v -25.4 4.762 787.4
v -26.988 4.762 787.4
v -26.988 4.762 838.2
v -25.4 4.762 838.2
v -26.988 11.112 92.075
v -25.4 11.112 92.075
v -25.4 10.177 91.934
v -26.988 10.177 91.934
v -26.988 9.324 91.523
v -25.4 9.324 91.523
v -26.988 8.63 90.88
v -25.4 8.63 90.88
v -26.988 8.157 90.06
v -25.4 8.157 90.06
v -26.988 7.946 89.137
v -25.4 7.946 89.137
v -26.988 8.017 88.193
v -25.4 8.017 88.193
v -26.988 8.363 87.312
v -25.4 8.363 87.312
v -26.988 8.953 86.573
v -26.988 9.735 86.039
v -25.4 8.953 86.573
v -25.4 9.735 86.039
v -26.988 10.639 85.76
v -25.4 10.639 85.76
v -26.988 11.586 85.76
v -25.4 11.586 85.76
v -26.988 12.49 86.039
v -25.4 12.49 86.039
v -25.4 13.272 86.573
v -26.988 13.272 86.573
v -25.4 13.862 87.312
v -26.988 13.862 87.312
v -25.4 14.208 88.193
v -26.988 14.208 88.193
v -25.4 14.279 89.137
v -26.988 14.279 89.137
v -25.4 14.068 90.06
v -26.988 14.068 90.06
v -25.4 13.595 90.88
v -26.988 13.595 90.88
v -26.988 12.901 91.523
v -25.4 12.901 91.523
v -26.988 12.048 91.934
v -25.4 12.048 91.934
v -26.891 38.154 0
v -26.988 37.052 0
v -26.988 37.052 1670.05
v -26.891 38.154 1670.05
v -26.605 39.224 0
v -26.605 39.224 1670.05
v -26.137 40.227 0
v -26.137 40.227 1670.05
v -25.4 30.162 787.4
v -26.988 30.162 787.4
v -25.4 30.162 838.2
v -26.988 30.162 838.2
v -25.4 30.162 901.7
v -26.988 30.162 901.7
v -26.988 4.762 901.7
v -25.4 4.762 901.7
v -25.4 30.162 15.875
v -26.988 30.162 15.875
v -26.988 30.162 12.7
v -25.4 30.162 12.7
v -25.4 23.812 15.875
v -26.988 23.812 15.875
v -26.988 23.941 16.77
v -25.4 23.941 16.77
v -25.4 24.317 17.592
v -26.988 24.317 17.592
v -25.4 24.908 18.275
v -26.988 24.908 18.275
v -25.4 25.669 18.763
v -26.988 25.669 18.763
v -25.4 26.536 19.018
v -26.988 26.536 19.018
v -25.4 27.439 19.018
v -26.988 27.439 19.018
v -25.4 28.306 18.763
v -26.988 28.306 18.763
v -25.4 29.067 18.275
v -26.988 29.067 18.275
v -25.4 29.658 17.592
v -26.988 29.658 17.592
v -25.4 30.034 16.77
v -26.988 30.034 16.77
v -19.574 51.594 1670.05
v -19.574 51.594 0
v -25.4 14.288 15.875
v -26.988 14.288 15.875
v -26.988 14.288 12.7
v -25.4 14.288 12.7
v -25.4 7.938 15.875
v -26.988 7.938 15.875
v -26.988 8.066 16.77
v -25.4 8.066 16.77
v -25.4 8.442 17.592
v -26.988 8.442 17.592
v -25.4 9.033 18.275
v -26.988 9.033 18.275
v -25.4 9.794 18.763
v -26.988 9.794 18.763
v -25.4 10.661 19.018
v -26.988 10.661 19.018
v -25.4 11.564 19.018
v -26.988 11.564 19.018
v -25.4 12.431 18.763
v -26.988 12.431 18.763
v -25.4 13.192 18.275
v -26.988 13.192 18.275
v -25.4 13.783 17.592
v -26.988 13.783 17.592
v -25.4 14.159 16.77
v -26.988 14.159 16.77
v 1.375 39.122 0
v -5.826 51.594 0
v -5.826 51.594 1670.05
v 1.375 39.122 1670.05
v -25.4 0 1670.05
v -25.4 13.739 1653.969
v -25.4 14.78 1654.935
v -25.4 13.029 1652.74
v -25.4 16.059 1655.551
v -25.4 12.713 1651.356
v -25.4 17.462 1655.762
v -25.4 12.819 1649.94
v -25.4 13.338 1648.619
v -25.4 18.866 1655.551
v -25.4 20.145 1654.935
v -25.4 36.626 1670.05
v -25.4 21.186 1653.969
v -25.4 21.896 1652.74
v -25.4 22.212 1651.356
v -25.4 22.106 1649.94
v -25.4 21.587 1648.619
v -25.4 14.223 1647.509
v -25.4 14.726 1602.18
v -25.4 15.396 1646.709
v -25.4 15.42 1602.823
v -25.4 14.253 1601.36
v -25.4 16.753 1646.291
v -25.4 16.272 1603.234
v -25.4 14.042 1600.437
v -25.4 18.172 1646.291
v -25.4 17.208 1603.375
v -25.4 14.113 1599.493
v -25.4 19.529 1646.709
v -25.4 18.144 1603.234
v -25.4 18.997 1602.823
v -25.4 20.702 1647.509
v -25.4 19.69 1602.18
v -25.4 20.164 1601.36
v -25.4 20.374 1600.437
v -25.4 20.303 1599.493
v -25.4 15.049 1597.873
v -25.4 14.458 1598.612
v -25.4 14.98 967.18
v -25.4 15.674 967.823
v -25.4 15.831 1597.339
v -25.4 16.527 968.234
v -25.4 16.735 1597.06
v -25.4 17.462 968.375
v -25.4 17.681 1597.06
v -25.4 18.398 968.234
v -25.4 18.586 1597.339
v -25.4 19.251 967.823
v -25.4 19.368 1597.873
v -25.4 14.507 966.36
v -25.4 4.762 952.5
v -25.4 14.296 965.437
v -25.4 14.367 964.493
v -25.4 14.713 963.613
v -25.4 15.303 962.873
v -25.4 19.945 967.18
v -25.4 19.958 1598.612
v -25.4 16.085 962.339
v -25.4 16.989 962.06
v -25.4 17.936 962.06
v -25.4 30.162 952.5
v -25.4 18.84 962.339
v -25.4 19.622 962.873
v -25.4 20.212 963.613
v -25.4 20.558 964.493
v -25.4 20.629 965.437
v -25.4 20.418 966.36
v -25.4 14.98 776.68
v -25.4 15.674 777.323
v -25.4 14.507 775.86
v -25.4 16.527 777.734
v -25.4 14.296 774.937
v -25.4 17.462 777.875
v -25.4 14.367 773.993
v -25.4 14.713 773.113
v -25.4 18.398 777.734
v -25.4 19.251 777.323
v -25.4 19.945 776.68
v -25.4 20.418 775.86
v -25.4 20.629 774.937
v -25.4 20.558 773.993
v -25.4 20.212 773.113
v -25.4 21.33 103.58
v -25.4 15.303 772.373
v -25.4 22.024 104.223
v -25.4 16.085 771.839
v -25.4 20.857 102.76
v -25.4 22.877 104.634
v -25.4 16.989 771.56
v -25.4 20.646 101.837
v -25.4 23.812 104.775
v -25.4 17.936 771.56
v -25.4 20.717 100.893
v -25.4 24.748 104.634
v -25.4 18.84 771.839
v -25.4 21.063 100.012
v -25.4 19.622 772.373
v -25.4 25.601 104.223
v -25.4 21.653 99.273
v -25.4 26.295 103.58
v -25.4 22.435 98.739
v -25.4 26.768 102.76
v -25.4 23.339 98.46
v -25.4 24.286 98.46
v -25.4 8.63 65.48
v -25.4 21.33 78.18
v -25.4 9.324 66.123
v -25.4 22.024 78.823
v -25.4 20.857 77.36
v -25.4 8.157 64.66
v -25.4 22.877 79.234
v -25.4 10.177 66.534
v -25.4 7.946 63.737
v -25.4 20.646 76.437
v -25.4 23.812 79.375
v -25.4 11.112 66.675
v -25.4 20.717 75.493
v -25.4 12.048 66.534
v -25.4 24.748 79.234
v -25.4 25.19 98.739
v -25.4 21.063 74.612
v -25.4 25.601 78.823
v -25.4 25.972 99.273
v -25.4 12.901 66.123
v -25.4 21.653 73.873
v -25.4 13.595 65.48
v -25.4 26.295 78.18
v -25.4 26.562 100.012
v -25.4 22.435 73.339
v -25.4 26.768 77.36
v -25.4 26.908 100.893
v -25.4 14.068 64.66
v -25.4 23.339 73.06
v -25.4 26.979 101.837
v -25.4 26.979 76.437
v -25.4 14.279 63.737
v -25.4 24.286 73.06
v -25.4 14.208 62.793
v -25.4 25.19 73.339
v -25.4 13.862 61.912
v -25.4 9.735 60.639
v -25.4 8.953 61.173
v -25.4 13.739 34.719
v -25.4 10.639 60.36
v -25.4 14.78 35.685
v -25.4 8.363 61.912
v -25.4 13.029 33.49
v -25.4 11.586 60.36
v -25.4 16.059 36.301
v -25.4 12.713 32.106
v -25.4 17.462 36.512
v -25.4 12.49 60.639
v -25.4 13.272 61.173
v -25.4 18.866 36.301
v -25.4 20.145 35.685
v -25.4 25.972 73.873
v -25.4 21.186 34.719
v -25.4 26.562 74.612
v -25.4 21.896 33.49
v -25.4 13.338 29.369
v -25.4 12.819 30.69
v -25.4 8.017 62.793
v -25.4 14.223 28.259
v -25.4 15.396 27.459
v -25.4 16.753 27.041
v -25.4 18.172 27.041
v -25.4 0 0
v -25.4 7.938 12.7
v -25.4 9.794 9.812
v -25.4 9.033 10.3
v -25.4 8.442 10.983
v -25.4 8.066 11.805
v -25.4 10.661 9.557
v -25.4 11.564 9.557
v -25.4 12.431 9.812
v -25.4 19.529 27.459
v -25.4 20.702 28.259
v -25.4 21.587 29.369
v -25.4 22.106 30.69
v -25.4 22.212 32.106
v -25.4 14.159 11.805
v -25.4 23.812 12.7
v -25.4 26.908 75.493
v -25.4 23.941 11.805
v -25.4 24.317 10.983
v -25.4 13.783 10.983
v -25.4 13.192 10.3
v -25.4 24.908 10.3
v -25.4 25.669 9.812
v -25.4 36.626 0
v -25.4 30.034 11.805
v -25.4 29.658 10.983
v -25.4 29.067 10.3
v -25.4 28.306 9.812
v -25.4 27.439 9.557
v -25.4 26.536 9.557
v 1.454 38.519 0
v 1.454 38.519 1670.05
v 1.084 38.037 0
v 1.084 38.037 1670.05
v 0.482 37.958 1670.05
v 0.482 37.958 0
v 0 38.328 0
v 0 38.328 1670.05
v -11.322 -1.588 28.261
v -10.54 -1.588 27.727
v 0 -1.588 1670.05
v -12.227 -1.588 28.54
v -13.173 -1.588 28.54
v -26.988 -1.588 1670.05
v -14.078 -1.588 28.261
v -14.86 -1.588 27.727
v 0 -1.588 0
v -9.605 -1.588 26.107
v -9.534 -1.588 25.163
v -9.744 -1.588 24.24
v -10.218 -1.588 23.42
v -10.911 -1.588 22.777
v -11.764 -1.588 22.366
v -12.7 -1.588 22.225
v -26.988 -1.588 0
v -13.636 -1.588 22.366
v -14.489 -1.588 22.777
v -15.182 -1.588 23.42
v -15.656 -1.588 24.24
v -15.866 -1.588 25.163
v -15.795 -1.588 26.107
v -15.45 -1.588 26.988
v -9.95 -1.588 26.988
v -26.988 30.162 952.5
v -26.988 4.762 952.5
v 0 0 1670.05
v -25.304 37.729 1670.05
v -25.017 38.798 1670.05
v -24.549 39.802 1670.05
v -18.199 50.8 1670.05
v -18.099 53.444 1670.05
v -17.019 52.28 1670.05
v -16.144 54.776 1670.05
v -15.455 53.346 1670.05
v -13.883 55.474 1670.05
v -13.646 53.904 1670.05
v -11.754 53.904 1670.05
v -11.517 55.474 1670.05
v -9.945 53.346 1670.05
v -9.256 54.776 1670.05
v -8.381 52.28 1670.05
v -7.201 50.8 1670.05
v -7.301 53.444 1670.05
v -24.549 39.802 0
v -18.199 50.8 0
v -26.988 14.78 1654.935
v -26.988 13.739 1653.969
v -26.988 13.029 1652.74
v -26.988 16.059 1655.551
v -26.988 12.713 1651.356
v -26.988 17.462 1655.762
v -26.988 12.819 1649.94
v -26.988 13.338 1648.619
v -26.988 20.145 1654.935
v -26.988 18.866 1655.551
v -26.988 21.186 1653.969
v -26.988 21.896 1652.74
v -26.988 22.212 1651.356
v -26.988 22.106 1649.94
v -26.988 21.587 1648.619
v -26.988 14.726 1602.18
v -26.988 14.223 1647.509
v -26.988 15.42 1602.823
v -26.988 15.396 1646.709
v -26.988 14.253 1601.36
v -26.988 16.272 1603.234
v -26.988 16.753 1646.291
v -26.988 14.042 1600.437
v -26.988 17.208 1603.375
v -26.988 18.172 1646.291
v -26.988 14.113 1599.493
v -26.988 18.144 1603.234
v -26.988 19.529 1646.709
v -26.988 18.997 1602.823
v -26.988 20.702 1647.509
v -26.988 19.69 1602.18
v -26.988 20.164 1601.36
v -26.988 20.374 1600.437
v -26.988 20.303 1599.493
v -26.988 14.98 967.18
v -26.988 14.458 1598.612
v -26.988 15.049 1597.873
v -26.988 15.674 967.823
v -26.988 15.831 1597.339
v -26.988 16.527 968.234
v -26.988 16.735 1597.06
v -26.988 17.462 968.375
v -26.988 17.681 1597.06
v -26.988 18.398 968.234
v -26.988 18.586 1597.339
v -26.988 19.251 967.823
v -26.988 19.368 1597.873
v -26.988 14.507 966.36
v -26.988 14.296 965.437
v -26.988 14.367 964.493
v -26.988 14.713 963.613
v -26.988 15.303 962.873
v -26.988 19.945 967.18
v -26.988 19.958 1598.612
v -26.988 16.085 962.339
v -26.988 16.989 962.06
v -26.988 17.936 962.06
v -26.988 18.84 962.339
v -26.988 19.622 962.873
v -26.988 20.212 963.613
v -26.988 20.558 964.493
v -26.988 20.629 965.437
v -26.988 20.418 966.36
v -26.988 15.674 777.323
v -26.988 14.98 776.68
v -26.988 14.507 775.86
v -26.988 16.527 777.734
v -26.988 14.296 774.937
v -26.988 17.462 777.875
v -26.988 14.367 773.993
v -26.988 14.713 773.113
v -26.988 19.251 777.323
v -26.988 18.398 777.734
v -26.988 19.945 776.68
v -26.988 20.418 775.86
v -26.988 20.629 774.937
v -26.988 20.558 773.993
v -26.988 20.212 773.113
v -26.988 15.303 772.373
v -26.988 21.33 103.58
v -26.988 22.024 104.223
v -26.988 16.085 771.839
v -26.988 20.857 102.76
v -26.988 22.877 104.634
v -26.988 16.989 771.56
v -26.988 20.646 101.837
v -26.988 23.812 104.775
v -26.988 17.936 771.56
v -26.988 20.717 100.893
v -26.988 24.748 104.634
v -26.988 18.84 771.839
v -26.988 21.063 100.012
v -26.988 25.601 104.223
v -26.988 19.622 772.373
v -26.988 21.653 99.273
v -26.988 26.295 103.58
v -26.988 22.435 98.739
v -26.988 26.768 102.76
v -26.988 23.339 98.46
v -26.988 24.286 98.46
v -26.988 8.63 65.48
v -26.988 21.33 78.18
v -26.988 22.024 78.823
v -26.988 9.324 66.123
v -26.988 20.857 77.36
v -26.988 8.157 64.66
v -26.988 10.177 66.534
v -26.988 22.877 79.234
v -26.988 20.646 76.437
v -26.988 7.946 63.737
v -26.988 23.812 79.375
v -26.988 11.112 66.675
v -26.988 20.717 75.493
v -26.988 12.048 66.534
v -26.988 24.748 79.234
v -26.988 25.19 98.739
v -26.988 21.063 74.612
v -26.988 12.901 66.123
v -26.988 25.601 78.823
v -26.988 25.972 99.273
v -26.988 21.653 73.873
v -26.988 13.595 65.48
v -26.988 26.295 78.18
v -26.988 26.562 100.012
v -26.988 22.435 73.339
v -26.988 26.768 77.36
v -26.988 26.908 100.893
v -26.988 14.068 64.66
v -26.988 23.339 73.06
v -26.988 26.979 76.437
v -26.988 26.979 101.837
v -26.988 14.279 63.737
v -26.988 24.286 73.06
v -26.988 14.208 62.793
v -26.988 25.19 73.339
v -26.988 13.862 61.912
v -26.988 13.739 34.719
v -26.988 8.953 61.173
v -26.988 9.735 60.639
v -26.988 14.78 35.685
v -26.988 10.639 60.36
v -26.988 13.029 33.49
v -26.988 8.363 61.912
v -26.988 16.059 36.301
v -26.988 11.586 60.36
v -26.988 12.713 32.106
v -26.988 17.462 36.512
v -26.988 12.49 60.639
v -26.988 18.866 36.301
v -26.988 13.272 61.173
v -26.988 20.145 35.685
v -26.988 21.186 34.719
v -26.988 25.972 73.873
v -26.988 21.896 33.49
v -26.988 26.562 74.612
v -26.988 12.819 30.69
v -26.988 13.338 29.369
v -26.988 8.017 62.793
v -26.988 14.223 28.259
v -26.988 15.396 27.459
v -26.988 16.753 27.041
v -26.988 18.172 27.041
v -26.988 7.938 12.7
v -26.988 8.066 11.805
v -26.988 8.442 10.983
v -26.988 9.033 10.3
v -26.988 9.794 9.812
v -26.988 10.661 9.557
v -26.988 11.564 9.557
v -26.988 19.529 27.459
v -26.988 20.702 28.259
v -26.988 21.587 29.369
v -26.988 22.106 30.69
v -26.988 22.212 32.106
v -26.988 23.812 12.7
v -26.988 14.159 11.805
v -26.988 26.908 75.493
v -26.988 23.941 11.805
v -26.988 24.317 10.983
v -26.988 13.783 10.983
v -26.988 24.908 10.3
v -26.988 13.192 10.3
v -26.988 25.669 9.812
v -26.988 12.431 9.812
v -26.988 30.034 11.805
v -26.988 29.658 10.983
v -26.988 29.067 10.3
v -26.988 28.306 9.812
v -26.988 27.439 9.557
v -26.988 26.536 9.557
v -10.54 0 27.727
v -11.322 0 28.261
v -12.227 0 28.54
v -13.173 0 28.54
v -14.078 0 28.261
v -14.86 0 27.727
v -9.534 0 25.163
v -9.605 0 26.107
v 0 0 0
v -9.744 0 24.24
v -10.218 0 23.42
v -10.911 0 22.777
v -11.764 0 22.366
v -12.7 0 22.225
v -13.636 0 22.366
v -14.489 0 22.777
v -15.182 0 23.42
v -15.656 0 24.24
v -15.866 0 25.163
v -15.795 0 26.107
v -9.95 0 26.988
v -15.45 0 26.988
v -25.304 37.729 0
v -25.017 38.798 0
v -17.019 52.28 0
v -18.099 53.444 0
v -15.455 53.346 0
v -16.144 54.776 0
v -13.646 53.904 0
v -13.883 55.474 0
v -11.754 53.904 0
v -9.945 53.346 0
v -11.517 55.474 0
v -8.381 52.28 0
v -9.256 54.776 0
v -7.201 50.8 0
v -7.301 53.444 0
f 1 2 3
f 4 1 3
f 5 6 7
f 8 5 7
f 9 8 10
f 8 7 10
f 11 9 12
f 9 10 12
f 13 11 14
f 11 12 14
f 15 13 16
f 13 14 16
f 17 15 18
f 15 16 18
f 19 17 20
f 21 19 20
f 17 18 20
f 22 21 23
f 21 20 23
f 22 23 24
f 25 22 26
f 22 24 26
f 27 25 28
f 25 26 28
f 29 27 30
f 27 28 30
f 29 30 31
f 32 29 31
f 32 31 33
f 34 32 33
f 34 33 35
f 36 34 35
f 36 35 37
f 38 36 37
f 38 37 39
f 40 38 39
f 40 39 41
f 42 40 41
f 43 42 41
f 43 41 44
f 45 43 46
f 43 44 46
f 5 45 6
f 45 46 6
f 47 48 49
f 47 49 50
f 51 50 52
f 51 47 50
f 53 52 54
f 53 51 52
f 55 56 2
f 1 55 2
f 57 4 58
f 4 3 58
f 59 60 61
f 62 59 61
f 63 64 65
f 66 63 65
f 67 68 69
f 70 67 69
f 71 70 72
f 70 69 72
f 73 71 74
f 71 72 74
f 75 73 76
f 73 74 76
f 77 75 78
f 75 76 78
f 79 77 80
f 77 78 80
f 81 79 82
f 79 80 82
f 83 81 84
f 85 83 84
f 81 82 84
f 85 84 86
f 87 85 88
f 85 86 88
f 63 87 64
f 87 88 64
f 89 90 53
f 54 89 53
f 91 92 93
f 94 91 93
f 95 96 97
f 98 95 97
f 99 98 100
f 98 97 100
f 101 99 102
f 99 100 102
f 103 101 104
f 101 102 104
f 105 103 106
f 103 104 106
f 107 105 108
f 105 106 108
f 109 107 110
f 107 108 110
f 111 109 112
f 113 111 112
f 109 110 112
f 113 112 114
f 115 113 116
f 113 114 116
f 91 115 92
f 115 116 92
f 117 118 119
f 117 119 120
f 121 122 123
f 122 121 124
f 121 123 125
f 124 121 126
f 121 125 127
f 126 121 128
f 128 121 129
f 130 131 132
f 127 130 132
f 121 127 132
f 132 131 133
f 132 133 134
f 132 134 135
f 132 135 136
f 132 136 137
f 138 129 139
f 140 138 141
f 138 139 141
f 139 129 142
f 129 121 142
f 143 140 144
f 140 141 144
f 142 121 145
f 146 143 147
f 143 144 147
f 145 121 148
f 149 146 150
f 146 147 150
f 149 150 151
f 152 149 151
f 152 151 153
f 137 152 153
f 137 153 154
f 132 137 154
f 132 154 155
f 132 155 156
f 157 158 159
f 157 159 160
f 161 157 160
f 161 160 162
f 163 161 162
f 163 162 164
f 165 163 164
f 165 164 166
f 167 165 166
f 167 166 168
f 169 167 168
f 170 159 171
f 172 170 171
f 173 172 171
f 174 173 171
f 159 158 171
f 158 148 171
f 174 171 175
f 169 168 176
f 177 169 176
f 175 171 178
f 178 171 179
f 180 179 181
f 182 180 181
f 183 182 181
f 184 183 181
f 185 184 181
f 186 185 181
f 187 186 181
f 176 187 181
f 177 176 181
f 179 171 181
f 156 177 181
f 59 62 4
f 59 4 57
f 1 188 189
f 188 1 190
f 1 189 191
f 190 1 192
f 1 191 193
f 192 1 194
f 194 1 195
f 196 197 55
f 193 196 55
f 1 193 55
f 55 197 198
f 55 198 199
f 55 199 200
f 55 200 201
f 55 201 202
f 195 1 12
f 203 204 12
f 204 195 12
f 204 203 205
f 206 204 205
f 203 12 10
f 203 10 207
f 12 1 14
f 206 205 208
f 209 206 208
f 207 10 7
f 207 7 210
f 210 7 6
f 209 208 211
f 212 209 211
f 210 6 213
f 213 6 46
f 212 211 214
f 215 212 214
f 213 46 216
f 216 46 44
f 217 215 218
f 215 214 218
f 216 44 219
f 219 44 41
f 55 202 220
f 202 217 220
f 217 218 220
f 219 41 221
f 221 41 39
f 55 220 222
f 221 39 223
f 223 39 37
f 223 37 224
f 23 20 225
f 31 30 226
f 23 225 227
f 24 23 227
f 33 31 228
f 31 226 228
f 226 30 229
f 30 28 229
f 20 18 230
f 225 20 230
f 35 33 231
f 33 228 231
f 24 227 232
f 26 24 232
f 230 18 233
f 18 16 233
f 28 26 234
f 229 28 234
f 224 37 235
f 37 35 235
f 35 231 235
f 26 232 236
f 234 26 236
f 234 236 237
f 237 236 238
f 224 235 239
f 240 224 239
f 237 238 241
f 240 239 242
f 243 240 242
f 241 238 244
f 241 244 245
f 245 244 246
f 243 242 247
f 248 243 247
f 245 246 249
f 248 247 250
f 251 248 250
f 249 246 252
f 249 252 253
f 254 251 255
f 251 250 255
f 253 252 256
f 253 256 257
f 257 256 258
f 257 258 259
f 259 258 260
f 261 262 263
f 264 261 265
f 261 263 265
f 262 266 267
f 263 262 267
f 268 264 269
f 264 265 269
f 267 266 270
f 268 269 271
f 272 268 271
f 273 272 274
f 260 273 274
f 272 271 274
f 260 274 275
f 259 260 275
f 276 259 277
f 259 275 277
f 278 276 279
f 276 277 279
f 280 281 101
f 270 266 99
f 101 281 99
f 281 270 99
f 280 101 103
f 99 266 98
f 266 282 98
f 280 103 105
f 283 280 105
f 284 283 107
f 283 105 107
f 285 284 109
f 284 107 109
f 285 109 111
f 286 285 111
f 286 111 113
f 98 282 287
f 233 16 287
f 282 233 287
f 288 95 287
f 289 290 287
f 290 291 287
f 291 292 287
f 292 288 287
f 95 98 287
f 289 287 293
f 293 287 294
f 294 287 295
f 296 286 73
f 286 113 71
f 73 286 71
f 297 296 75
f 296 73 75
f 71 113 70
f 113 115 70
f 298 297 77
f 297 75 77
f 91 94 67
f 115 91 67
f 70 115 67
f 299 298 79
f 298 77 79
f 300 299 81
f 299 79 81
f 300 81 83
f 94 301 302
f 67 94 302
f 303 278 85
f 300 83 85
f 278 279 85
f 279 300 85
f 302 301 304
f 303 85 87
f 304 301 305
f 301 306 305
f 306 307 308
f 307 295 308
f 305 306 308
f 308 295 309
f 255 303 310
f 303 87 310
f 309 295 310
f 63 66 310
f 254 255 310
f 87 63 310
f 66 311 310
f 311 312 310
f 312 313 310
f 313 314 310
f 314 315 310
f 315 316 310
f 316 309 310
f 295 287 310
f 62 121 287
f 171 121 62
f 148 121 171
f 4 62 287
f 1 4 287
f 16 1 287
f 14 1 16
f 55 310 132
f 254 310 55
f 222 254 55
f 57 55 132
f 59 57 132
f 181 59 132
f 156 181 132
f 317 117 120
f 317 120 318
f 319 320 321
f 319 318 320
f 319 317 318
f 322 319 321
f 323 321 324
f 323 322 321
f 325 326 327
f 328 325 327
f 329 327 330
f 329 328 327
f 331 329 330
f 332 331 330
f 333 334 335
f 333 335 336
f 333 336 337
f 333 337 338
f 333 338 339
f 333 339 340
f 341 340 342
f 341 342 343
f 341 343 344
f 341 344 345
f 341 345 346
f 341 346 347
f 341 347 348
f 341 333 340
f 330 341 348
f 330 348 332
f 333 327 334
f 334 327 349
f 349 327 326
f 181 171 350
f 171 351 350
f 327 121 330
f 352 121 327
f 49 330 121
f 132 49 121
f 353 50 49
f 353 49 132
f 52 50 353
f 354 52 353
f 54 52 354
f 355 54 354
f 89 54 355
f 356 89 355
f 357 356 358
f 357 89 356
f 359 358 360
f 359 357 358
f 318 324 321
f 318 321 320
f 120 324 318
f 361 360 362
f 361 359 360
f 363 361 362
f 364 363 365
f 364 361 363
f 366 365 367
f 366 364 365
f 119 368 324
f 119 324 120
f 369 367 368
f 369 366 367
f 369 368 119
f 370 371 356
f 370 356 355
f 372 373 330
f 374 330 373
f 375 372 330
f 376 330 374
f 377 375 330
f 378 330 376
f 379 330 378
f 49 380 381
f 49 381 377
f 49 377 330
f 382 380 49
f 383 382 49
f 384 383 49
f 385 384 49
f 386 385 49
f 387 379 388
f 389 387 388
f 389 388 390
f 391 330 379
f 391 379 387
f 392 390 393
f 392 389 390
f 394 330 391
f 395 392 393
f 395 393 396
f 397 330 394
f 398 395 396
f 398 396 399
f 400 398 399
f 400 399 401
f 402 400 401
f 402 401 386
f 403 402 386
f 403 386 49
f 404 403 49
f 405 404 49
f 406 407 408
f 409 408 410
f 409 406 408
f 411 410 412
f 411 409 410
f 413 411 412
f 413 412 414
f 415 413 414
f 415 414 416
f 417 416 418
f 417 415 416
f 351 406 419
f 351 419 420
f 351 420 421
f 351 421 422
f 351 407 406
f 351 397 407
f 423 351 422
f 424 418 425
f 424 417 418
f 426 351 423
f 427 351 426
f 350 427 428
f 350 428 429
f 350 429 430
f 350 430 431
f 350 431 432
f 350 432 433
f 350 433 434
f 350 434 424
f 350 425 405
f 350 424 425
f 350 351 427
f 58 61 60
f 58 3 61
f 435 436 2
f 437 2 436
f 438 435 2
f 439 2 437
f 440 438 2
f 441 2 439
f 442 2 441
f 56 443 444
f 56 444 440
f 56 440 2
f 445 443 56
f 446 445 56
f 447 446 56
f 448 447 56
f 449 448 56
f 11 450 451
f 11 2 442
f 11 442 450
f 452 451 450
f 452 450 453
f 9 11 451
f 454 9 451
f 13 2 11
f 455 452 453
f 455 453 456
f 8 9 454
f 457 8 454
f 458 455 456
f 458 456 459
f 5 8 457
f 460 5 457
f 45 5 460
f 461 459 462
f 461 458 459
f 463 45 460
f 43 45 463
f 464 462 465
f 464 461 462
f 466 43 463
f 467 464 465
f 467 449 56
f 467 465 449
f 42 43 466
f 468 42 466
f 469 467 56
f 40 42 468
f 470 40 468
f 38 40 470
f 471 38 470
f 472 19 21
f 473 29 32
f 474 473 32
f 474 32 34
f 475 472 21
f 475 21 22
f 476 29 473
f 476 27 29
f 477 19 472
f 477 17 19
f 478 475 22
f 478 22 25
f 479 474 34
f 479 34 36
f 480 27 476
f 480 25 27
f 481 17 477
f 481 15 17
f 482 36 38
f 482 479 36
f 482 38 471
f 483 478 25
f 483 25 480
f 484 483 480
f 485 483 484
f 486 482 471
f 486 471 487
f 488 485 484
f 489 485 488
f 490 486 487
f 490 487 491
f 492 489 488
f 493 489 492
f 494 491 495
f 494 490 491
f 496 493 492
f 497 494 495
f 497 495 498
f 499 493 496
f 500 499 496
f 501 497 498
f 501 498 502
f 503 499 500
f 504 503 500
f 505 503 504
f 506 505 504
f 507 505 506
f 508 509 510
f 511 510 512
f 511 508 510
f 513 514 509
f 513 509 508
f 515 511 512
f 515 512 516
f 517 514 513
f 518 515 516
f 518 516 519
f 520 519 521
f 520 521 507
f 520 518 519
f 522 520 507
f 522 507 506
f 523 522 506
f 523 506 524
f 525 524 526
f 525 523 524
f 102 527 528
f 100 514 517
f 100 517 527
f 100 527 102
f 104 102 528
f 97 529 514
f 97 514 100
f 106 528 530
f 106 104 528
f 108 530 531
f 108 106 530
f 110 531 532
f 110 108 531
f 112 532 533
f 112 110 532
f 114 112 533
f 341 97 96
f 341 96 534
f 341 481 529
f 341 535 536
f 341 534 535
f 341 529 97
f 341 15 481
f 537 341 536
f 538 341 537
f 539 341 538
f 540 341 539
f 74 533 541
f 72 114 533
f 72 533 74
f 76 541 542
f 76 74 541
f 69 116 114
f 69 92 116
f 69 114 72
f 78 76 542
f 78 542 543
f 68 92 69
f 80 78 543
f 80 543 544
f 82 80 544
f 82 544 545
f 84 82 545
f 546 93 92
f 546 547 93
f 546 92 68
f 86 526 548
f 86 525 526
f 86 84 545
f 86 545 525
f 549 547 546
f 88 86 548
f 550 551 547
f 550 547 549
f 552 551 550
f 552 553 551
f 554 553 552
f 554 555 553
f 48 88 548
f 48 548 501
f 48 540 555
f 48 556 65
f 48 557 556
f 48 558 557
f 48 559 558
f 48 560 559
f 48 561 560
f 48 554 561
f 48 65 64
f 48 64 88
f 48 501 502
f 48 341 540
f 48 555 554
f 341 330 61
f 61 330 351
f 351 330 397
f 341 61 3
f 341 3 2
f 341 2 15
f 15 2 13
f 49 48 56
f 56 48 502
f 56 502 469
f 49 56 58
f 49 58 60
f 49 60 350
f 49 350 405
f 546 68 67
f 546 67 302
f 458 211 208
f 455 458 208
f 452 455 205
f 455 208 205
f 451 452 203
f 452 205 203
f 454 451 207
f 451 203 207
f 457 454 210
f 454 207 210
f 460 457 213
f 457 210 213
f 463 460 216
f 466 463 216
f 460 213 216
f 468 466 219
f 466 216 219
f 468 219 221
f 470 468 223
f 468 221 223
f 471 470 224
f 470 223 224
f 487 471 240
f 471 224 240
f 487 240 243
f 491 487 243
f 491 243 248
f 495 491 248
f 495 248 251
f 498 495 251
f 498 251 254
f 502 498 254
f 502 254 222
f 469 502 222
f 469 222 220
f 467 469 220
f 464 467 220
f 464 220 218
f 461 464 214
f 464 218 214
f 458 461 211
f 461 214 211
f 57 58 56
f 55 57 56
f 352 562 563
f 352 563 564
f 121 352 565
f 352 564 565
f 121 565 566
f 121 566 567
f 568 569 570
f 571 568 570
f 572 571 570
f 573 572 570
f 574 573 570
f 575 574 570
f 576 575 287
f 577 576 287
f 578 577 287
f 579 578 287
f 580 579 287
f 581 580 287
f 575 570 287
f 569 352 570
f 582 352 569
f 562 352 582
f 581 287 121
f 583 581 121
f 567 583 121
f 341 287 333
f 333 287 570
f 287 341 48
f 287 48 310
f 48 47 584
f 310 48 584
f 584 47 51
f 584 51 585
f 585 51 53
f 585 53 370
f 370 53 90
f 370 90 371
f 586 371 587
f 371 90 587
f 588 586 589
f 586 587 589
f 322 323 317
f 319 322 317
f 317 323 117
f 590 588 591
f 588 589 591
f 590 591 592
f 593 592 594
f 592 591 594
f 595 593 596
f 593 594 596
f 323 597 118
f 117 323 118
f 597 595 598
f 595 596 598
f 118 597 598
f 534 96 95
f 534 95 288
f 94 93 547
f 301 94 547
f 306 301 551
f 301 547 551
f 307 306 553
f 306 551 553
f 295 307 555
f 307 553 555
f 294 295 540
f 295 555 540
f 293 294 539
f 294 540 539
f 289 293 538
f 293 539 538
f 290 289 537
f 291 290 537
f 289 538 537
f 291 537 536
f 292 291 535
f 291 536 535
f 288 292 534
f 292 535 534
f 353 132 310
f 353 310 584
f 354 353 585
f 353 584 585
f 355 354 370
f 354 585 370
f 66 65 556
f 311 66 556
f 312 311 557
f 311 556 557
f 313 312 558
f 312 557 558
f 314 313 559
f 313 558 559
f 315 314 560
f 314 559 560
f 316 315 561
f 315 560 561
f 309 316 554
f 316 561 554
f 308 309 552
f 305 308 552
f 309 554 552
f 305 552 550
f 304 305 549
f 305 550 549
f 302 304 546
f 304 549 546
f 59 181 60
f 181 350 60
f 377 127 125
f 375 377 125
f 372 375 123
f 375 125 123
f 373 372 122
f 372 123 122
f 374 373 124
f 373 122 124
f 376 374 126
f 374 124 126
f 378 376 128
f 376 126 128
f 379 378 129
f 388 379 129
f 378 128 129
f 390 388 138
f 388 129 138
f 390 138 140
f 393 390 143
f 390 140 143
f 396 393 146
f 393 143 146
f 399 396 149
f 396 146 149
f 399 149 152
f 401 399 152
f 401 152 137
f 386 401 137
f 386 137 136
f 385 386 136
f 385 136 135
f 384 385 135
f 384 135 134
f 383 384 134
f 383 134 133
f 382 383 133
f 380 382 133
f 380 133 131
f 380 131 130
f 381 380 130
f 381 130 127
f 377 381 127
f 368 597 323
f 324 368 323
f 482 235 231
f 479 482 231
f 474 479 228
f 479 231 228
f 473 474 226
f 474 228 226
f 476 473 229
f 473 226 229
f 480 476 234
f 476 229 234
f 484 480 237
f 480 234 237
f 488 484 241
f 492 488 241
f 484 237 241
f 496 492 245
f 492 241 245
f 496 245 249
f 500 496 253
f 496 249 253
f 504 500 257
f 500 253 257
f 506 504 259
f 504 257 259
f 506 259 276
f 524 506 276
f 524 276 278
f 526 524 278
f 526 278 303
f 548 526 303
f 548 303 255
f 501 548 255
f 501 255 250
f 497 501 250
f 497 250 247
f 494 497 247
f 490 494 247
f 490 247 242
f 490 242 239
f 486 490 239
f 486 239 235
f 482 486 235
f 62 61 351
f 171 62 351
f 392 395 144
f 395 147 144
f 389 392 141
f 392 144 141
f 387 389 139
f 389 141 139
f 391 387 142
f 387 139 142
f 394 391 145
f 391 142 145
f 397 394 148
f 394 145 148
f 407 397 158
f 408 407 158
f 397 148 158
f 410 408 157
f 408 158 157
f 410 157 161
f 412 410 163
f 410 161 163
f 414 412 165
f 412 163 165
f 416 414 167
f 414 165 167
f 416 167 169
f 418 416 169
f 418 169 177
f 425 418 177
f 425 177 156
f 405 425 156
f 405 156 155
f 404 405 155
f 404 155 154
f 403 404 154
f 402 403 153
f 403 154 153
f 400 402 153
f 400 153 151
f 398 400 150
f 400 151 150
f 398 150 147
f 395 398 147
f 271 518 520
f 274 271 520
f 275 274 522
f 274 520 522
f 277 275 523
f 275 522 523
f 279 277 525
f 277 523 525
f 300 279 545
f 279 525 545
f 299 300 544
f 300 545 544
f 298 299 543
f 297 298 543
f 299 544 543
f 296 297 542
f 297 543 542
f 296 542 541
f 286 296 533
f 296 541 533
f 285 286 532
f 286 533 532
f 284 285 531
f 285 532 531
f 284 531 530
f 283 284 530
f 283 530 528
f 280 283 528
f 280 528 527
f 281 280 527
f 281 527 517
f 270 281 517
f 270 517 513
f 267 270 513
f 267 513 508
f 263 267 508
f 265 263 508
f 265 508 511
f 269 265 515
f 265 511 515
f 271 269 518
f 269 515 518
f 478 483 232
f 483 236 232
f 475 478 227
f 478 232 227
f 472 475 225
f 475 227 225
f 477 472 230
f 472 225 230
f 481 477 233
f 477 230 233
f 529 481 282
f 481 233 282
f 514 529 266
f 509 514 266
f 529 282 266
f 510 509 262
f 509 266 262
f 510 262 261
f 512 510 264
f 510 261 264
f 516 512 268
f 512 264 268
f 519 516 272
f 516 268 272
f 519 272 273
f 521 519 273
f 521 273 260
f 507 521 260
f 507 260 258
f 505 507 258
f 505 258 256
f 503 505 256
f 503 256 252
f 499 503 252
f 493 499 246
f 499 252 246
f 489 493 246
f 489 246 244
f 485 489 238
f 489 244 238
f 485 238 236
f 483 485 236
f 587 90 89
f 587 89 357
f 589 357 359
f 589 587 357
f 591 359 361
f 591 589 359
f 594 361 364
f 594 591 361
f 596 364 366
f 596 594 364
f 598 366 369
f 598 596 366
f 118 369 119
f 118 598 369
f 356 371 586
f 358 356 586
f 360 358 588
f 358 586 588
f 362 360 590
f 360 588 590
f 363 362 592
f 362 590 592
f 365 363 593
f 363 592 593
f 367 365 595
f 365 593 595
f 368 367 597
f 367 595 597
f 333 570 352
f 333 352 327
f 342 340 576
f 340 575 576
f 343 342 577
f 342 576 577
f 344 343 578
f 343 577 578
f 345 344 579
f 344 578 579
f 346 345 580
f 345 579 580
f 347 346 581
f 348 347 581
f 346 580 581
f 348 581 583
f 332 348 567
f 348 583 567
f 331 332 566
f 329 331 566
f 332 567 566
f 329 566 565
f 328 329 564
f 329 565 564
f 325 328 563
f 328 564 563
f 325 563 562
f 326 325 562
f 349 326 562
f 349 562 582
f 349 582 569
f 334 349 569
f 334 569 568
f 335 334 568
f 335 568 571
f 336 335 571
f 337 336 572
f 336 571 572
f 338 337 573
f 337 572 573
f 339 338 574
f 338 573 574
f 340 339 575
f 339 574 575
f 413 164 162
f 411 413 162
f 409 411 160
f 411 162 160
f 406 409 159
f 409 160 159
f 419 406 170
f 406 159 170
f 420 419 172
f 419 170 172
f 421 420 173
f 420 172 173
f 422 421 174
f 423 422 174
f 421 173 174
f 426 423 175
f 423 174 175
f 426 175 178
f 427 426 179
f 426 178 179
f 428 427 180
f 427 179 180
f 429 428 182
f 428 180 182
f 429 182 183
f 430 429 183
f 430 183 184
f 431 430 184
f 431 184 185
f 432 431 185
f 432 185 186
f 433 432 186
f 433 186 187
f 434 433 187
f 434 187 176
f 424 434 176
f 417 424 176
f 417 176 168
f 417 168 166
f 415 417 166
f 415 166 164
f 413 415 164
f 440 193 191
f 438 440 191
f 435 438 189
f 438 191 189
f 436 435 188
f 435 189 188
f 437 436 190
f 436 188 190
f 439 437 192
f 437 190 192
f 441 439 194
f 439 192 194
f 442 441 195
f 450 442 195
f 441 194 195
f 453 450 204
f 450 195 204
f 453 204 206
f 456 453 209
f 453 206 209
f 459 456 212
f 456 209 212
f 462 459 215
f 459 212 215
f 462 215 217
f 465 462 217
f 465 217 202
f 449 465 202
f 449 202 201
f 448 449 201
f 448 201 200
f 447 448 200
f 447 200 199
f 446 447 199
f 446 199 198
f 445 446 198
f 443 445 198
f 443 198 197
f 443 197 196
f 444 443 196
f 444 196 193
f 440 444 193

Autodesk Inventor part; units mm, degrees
ref_plane "YZ Plane" through (0, 0, 0) normal (1, 0, 0) x (0, 1, 0)
ref_plane "XZ Plane" through (0, 0, 0) normal (0, 1, 0) x (-1, 0, 0)
ref_plane "XY Plane" through (0, 0, 0) normal (0, 0, 1) x (1, 0, 0)
sketch "Sketch1" plane through (0, 0, 0) normal (0, 0, 1) x (1, 0, 0)
  line L0 (0, 0) -> (-12.7, 0) construction
  line L1 (-12.7, 0) -> (-12.7, 53.975) construction
  line L2 (-12.7, 53.975) -> (0, 53.975) construction
  line L3 (0, 53.975) -> (0, 0) construction
  line L4 (-12.7, 53.975) -> (-25.4, 53.975) construction
  line L5 (-12.7, 53.975) -> (0, 53.975) construction
  line L6 (-25.4, 53.975) -> (-25.4, 0) construction
  line L7 (-25.4, 0) -> (-12.7, 0) construction
  circle A0 centre (-12.7, 6.35) radius 6.35 construction
  circle A1 centre (-12.7, 47.625) radius 6.35 construction
  line L8 (-12.7, 47.625) -> (-18.1993, 50.8) construction
  line L9 (-12.7, 47.625) -> (-6.35, 47.625) construction
  line L10 (-12.7, 47.625) -> (-7.2007, 50.8) construction
  line L11 (-12.7, 47.625) -> (-6.35, 47.625) construction
  line L12 (0, 0) -> (-25.4, 0)
  line L13 (0, 0) -> (0, -1.5875)
  line L14 (0, 0) -> (1.5875, 0) construction
  line L15 (0, -1.5875) -> (-26.9875, -1.5875)
  arc A2 (-7.2007, 50.8) -> (-18.1993, 50.8) centre (-12.7, 47.625) ccw
  line L16 (-7.2007, 50.8) -> (0, 38.328)
  line L17 (-7.2007, 50.8) -> (7.2007, 50.8) construction
  line L18 (-18.1993, 50.8) -> (-24.5493, 39.8015)
  line L19 (-18.1993, 50.8) -> (-5.4993, 50.8) construction
  line L20 (-25.4, 0) -> (-25.4, 36.6265)
  line L21 (-19.5741, 51.5937) -> (-26.1368, 40.2268)
  line L22 (-26.9875, -1.5875) -> (-26.9875, 37.0518)
  arc A3 (-26.1368, 40.2268) -> (-26.9875, 37.0518) centre (-20.6375, 37.0518) ccw
  arc A4 (-24.5493, 39.8015) -> (-25.4, 36.6265) centre (-19.05, 36.6265) ccw
  line L23 (-5.8259, 51.5937) -> (1.3748, 39.1217)
  arc A5 (-5.8259, 51.5937) -> (-19.5741, 51.5937) centre (-12.7, 47.625) ccw
  arc A6 (0, 38.328) -> (1.3748, 39.1217) centre (0.6874, 38.7248) ccw
  point P0 (-25.4, 38.328)
  dimension "d0" = 12.7
  dimension "d1" = 53.975
  dimension "d2" = 12.7
  dimension "d3" = 180
  dimension "d4" = 53.975
  dimension "d5" = 90
  dimension "d6" = 12.7
  dimension "d7" = 12.7
  dimension "d8" = 6.35
  dimension "d9" = 6.35
  dimension "d10" = 6.35
  dimension "d11" = 150
  dimension "d12" = 6.35
  dimension "d13" = 30
  dimension "d14" = 1.5875
  dimension "d15" = 90
  dimension "d16" = 26.9875
  dimension "d17" = 6.35
  dimension "d18" = 60
  dimension "d19" = 120
  dimension "d20" = 90
  dimension "d21" = 1.5875
  dimension "d22" = 6.35
  dimension "d23" = 6.35
  dimension "d24" = 1.5875
  dimension "d25" = 7.9375
  dimension "d26" = 0
extrude "Extrusion1" add sketch "Sketch1" along normal blind 1689.1
sketch "Sketch2" plane through (-26.9875, -1.5875, 0) normal (-1, 0, 0) x (0, 0, 1)
  line L0 (0, 38.6393) -> (0, 0) projected
  line L1 (0, 0) -> (1689.1, 0) projected
  line L2 (1689.1, 38.6393) -> (1689.1, 0) projected
  line L3 (0, 38.6393) -> (1689.1, 38.6393) projected
  point P0 (0, 1.5875)
  point P1 (1651, 19.05)
  dimension "d29" = 19.05
  dimension "d30" = 38.1
hole "Hole1" at (-26.9875, 17.4625, 1651) direction (1, 0, 0) diameter 9.525 end through all
sketch "Sketch3" plane through (-26.9875, -1.5875, 0) normal (-1, 0, 0) x (0, 0, 1)
  circle A0 centre (1651, 19.05) radius 4.7625 projected
  line L0 (0, 38.6393) -> (0, 0) projected
  line L1 (0, 0) -> (1689.1, 0) projected
  line L2 (1689.1, 38.6393) -> (1689.1, 0) projected
  line L3 (0, 38.6393) -> (1689.1, 38.6393) projected
  circle A1 centre (31.75, 19.05) radius 4.7625
  line L4 (15.875, 28.575) -> (15.875, 25.4) construction
  line L5 (15.875, 28.575) -> (15.875, 31.75) construction
  line L6 (12.7, 28.575) -> (12.7, 31.75) construction
  line L7 (12.7, 28.575) -> (12.7, 25.4) construction
  line L8 (15.875, 12.7) -> (15.875, 15.875) construction
  line L9 (12.7, 12.7) -> (12.7, 15.875) construction
  line L10 (15.875, 12.7) -> (15.875, 9.525) construction
  line L11 (12.7, 12.7) -> (12.7, 9.525) construction
  arc A2 (15.875, 25.4) -> (15.875, 31.75) centre (15.875, 28.575) ccw
  arc A3 (12.7, 31.75) -> (12.7, 25.4) centre (12.7, 28.575) ccw
  arc A4 (15.875, 9.525) -> (15.875, 15.875) centre (15.875, 12.7) ccw
  arc A5 (12.7, 15.875) -> (12.7, 9.525) centre (12.7, 12.7) ccw
  line L12 (15.875, 31.75) -> (12.7, 31.75)
  line L13 (15.875, 25.4) -> (12.7, 25.4)
  line L14 (15.875, 15.875) -> (12.7, 15.875)
  line L15 (15.875, 9.525) -> (12.7, 9.525)
  point P0 (0, 1.5875)
  dimension "d45" = 12.7
  dimension "d46" = 15.875
  dimension "d47" = 31.75
  dimension "d48" = 12.7
  dimension "d49" = 15.875
  dimension "d50" = 9.525
  dimension "d51" = 19.05
  dimension "d52" = 12.7
  dimension "d53" = 12.7
  dimension "d54" = 28.575
  dimension "d55" = 28.575
  dimension "d56" = 3.175
  dimension "d57" = 3.175
  dimension "d58" = 3.175
  dimension "d59" = 3.175
  dimension "d60" = 3.175
  dimension "d61" = 3.175
  dimension "d62" = 3.175
  dimension "d63" = 3.175
  dimension "d64" = 3.175
  dimension "d65" = 3.175
  dimension "d66" = 3.175
  dimension "d67" = 3.175
extrude "Extrusion2" cut sketch "Sketch3" against normal blind 25.4 contours A1 | L13 A3 L12 A2 | L15 A5 L14 A4
sketch "Sketch4" plane through (-26.9875, -1.5875, 0) normal (-1, 0, 0) x (0, 0, 1)
  line L0 (12.7, 15.875) -> (15.875, 15.875) projected
  arc A0 (15.875, 9.525) -> (15.875, 15.875) centre (15.875, 12.7) ccw projected
  line L1 (15.875, 9.525) -> (12.7, 9.525) projected
  arc A1 (12.7, 15.875) -> (12.7, 9.525) centre (12.7, 12.7) ccw projected
  line L2 (12.7, 31.75) -> (15.875, 31.75) projected
  arc A2 (15.875, 25.4) -> (15.875, 31.75) centre (15.875, 28.575) ccw projected
  line L3 (15.875, 25.4) -> (12.7, 25.4) projected
  arc A3 (12.7, 31.75) -> (12.7, 25.4) centre (12.7, 28.575) ccw projected
  circle A4 centre (31.75, 19.05) radius 4.7625 projected
  circle A5 centre (1651, 19.05) radius 4.7625 projected
  line L4 (0, 38.6393) -> (0, 0) projected
  line L5 (0, 0) -> (1689.1, 0) projected
  line L6 (1689.1, 38.6393) -> (1689.1, 0) projected
  line L7 (0, 38.6393) -> (1689.1, 38.6393) projected
  point P0 (0, 1.5875)
  point P1 (101.6, 25.4)
  point P2 (88.9, 12.7)
  point P3 (76.2, 25.4)
  point P4 (63.5, 12.7)
  dimension "d70" = 63.5
  dimension "d71" = 76.2
  dimension "d72" = 88.9
  dimension "d73" = 101.6
  dimension "d74" = 12.7
  dimension "d77" = 12.7
  dimension "d120" = 25.4
  dimension "d121" = 25.4
hole "Hole2" at (-26.9875, 23.8125, 101.6) at (-26.9875, 11.1125, 88.9) at (-26.9875, 23.8125, 76.2) at (-26.9875, 11.1125, 63.5) direction (1, 0, 0) diameter 6.35 end through all
sketch "Sketch6" plane through (-26.9875, -1.5875, 0) normal (-1, 0, 0) x (0, 0, 1)
  circle A0 centre (76.2, 25.4) radius 3.175 projected
  circle A1 centre (101.6, 25.4) radius 3.175 projected
  circle A2 centre (88.9, 12.7) radius 3.175 projected
  circle A3 centre (63.5, 12.7) radius 3.175 projected
  line L0 (12.7, 15.875) -> (15.875, 15.875) projected
  arc A4 (15.875, 9.525) -> (15.875, 15.875) centre (15.875, 12.7) ccw projected
  line L1 (15.875, 9.525) -> (12.7, 9.525) projected
  arc A5 (12.7, 15.875) -> (12.7, 9.525) centre (12.7, 12.7) ccw projected
  line L2 (12.7, 31.75) -> (15.875, 31.75) projected
  arc A6 (15.875, 25.4) -> (15.875, 31.75) centre (15.875, 28.575) ccw projected
  line L3 (15.875, 25.4) -> (12.7, 25.4) projected
  arc A7 (12.7, 31.75) -> (12.7, 25.4) centre (12.7, 28.575) ccw projected
  circle A8 centre (31.75, 19.05) radius 4.7625 projected
  circle A9 centre (1651, 19.05) radius 4.7625 projected
  line L4 (0, 38.6393) -> (0, 0) projected
  line L5 (0, 0) -> (1689.1, 0) projected
  line L6 (1689.1, 38.6393) -> (1689.1, 0) projected
  line L7 (0, 38.6393) -> (1689.1, 38.6393) projected
  line L8 (787.4, 6.35) -> (838.2, 6.35)
  line L9 (838.2, 6.35) -> (838.2, 31.75)
  line L10 (838.2, 31.75) -> (787.4, 31.75)
  line L11 (787.4, 31.75) -> (787.4, 6.35)
  line L12 (901.7, 6.35) -> (952.5, 6.35)
  line L13 (952.5, 6.35) -> (952.5, 31.75)
  line L14 (952.5, 31.75) -> (901.7, 31.75)
  line L15 (901.7, 31.75) -> (901.7, 6.35)
  point P0 (0, 1.5875)
  dimension "d98" = 50.8
  dimension "d99" = 25.4
  dimension "d100" = 50.8
  dimension "d101" = 25.4
  dimension "d102" = 787.4
  dimension "d103" = 901.7
  dimension "d104" = 6.35
  dimension "d105" = 6.35
extrude "Extrusion3" cut sketch "Sketch6" against normal blind 25.4 contours L11 L10 L9 L8 | L15 L14 L13 L12
sketch "Sketch8" plane through (-26.9875, -1.5875, 0) normal (-1, 0, 0) x (0, 0, 1)
  line L0 (838.2, 31.75) -> (838.2, 6.35) projected
  line L1 (838.2, 6.35) -> (787.4, 6.35) projected
  line L2 (787.4, 6.35) -> (787.4, 31.75) projected
  line L3 (787.4, 31.75) -> (838.2, 31.75) projected
  line L4 (952.5, 31.75) -> (952.5, 6.35) projected
  line L5 (952.5, 6.35) -> (901.7, 6.35) projected
  line L6 (901.7, 6.35) -> (901.7, 31.75) projected
  line L7 (901.7, 31.75) -> (952.5, 31.75) projected
  circle A0 centre (76.2, 25.4) radius 3.175 projected
  circle A1 centre (101.6, 25.4) radius 3.175 projected
  circle A2 centre (88.9, 12.7) radius 3.175 projected
  circle A3 centre (63.5, 12.7) radius 3.175 projected
  line L8 (12.7, 15.875) -> (15.875, 15.875) projected
  arc A4 (15.875, 9.525) -> (15.875, 15.875) centre (15.875, 12.7) ccw projected
  line L9 (15.875, 9.525) -> (12.7, 9.525) projected
  arc A5 (12.7, 15.875) -> (12.7, 9.525) centre (12.7, 12.7) ccw projected
  line L10 (12.7, 31.75) -> (15.875, 31.75) projected
  arc A6 (15.875, 25.4) -> (15.875, 31.75) centre (15.875, 28.575) ccw projected
  line L11 (15.875, 25.4) -> (12.7, 25.4) projected
  arc A7 (12.7, 31.75) -> (12.7, 25.4) centre (12.7, 28.575) ccw projected
  circle A8 centre (31.75, 19.05) radius 4.7625 projected
  circle A9 centre (1651, 19.05) radius 4.7625 projected
  line L12 (0, 38.6393) -> (0, 0) projected
  line L13 (0, 0) -> (1689.1, 0) projected
  line L14 (1689.1, 38.6393) -> (1689.1, 0) projected
  line L15 (0, 38.6393) -> (1689.1, 38.6393) projected
  point P0 (0, 1.5875)
  point P1 (965.2, 19.05)
  point P2 (774.7, 19.05)
  dimension "d122" = 19.05
  dimension "d123" = 19.05
  dimension "d124" = 190.5
  dimension "d125" = 774.7
hole "Hole5" at (-26.9875, 17.4625, 965.2) at (-26.9875, 17.4625, 774.7) direction (1, 0, 0) diameter 6.35 end through all
sketch "Sketch9" plane through (0, -1.5875, 0) normal (0, -1, 0) x (1, 0, 0)
  line L0 (-26.9875, 0) -> (0, 0) projected
  line L1 (0, 0) -> (0, 1689.1) projected
  line L2 (-26.9875, 1689.1) -> (0, 1689.1) projected
  point P0 (-12.7, 25.4)
  point P1 (-12.7, 1676.4)
  dimension "d135" = 12.7
  dimension "d136" = 12.7
  dimension "d137" = 12.7
  dimension "d138" = 25.4
hole "Hole6" at (-12.7, -1.5875, 25.4) at (-12.7, -1.5875, 1676.4) direction (0, 1, 0) diameter 6.35 depth 25.4 tip angle 118
sketch "Sketch10" plane through (0, 0, 1689.1) normal (0, 0, 1) x (1, 0, 0)
  line L0 (0, 0) -> (-25.4, 0) projected
  line L1 (-25.4, 0) -> (-25.4, 36.6265) projected
  arc A0 (-24.5493, 39.8015) -> (-25.4, 36.6265) centre (-19.05, 36.6265) ccw projected
  line L2 (-24.5493, 39.8015) -> (-18.1993, 50.8) projected
  arc A1 (-7.2007, 50.8) -> (-18.1993, 50.8) centre (-12.7, 47.625) ccw projected
  line L3 (-7.2007, 50.8) -> (0, 38.328) projected
  arc A2 (0, 38.328) -> (1.3748, 39.1217) centre (0.6874, 38.7248) ccw projected
  line L4 (1.3748, 39.1217) -> (-5.8259, 51.5937) projected
  arc A3 (-5.8259, 51.5937) -> (-19.5741, 51.5937) centre (-12.7, 47.625) ccw projected
  line L5 (-19.5741, 51.5937) -> (-26.1368, 40.2268) projected
  arc A4 (-26.1368, 40.2268) -> (-26.9875, 37.0518) centre (-20.6375, 37.0518) ccw projected
  line L6 (-26.9875, 37.0518) -> (-26.9875, -1.5875) projected
  line L7 (-26.9875, -1.5875) -> (0, -1.5875) projected
  line L8 (0, -1.5875) -> (0, 0) projected
extrude "Extrusion4" cut sketch "Sketch10" against normal blind 19.05
sketch "Sketch11" plane through (-26.9875, -1.5875, 0) normal (-1, 0, 0) x (0, 0, 1)
  line L0 (1670.05, 0) -> (1670.05, 38.6393) projected
  line L1 (0, 38.6393) -> (1670.05, 38.6393) projected
  line L2 (0, 38.6393) -> (0, 0) projected
  line L3 (0, 0) -> (1670.05, 0) projected
  circle A0 centre (965.2, 19.05) radius 3.175 projected
  circle A1 centre (774.7, 19.05) radius 3.175 projected
  line L4 (838.2, 31.75) -> (838.2, 6.35) projected
  line L5 (838.2, 6.35) -> (787.4, 6.35) projected
  line L6 (787.4, 6.35) -> (787.4, 31.75) projected
  line L7 (787.4, 31.75) -> (838.2, 31.75) projected
  line L8 (952.5, 31.75) -> (952.5, 6.35) projected
  line L9 (952.5, 6.35) -> (901.7, 6.35) projected
  line L10 (901.7, 6.35) -> (901.7, 31.75) projected
  line L11 (901.7, 31.75) -> (952.5, 31.75) projected
  circle A2 centre (76.2, 25.4) radius 3.175 projected
  circle A3 centre (101.6, 25.4) radius 3.175 projected
  circle A4 centre (88.9, 12.7) radius 3.175 projected
  circle A5 centre (63.5, 12.7) radius 3.175 projected
  line L12 (12.7, 15.875) -> (15.875, 15.875) projected
  arc A6 (15.875, 9.525) -> (15.875, 15.875) centre (15.875, 12.7) ccw projected
  line L13 (15.875, 9.525) -> (12.7, 9.525) projected
  arc A7 (12.7, 15.875) -> (12.7, 9.525) centre (12.7, 12.7) ccw projected
  line L14 (12.7, 31.75) -> (15.875, 31.75) projected
  arc A8 (15.875, 25.4) -> (15.875, 31.75) centre (15.875, 28.575) ccw projected
  line L15 (15.875, 25.4) -> (12.7, 25.4) projected
  arc A9 (12.7, 31.75) -> (12.7, 25.4) centre (12.7, 28.575) ccw projected
  circle A10 centre (31.75, 19.05) radius 4.7625 projected
  circle A11 centre (1651, 19.05) radius 4.7625 projected
  point P0 (0, 1.5875)
  point P1 (1600.2, 18.7956)
  dimension "d148" = 19.8438
  dimension "d149" = 69.85
hole "Hole7" at (-26.9875, 17.2081, 1600.2) direction (1, 0, 0) diameter 6.35 end through all
properties part number "2in rail right" material "Steel, Alloy"
